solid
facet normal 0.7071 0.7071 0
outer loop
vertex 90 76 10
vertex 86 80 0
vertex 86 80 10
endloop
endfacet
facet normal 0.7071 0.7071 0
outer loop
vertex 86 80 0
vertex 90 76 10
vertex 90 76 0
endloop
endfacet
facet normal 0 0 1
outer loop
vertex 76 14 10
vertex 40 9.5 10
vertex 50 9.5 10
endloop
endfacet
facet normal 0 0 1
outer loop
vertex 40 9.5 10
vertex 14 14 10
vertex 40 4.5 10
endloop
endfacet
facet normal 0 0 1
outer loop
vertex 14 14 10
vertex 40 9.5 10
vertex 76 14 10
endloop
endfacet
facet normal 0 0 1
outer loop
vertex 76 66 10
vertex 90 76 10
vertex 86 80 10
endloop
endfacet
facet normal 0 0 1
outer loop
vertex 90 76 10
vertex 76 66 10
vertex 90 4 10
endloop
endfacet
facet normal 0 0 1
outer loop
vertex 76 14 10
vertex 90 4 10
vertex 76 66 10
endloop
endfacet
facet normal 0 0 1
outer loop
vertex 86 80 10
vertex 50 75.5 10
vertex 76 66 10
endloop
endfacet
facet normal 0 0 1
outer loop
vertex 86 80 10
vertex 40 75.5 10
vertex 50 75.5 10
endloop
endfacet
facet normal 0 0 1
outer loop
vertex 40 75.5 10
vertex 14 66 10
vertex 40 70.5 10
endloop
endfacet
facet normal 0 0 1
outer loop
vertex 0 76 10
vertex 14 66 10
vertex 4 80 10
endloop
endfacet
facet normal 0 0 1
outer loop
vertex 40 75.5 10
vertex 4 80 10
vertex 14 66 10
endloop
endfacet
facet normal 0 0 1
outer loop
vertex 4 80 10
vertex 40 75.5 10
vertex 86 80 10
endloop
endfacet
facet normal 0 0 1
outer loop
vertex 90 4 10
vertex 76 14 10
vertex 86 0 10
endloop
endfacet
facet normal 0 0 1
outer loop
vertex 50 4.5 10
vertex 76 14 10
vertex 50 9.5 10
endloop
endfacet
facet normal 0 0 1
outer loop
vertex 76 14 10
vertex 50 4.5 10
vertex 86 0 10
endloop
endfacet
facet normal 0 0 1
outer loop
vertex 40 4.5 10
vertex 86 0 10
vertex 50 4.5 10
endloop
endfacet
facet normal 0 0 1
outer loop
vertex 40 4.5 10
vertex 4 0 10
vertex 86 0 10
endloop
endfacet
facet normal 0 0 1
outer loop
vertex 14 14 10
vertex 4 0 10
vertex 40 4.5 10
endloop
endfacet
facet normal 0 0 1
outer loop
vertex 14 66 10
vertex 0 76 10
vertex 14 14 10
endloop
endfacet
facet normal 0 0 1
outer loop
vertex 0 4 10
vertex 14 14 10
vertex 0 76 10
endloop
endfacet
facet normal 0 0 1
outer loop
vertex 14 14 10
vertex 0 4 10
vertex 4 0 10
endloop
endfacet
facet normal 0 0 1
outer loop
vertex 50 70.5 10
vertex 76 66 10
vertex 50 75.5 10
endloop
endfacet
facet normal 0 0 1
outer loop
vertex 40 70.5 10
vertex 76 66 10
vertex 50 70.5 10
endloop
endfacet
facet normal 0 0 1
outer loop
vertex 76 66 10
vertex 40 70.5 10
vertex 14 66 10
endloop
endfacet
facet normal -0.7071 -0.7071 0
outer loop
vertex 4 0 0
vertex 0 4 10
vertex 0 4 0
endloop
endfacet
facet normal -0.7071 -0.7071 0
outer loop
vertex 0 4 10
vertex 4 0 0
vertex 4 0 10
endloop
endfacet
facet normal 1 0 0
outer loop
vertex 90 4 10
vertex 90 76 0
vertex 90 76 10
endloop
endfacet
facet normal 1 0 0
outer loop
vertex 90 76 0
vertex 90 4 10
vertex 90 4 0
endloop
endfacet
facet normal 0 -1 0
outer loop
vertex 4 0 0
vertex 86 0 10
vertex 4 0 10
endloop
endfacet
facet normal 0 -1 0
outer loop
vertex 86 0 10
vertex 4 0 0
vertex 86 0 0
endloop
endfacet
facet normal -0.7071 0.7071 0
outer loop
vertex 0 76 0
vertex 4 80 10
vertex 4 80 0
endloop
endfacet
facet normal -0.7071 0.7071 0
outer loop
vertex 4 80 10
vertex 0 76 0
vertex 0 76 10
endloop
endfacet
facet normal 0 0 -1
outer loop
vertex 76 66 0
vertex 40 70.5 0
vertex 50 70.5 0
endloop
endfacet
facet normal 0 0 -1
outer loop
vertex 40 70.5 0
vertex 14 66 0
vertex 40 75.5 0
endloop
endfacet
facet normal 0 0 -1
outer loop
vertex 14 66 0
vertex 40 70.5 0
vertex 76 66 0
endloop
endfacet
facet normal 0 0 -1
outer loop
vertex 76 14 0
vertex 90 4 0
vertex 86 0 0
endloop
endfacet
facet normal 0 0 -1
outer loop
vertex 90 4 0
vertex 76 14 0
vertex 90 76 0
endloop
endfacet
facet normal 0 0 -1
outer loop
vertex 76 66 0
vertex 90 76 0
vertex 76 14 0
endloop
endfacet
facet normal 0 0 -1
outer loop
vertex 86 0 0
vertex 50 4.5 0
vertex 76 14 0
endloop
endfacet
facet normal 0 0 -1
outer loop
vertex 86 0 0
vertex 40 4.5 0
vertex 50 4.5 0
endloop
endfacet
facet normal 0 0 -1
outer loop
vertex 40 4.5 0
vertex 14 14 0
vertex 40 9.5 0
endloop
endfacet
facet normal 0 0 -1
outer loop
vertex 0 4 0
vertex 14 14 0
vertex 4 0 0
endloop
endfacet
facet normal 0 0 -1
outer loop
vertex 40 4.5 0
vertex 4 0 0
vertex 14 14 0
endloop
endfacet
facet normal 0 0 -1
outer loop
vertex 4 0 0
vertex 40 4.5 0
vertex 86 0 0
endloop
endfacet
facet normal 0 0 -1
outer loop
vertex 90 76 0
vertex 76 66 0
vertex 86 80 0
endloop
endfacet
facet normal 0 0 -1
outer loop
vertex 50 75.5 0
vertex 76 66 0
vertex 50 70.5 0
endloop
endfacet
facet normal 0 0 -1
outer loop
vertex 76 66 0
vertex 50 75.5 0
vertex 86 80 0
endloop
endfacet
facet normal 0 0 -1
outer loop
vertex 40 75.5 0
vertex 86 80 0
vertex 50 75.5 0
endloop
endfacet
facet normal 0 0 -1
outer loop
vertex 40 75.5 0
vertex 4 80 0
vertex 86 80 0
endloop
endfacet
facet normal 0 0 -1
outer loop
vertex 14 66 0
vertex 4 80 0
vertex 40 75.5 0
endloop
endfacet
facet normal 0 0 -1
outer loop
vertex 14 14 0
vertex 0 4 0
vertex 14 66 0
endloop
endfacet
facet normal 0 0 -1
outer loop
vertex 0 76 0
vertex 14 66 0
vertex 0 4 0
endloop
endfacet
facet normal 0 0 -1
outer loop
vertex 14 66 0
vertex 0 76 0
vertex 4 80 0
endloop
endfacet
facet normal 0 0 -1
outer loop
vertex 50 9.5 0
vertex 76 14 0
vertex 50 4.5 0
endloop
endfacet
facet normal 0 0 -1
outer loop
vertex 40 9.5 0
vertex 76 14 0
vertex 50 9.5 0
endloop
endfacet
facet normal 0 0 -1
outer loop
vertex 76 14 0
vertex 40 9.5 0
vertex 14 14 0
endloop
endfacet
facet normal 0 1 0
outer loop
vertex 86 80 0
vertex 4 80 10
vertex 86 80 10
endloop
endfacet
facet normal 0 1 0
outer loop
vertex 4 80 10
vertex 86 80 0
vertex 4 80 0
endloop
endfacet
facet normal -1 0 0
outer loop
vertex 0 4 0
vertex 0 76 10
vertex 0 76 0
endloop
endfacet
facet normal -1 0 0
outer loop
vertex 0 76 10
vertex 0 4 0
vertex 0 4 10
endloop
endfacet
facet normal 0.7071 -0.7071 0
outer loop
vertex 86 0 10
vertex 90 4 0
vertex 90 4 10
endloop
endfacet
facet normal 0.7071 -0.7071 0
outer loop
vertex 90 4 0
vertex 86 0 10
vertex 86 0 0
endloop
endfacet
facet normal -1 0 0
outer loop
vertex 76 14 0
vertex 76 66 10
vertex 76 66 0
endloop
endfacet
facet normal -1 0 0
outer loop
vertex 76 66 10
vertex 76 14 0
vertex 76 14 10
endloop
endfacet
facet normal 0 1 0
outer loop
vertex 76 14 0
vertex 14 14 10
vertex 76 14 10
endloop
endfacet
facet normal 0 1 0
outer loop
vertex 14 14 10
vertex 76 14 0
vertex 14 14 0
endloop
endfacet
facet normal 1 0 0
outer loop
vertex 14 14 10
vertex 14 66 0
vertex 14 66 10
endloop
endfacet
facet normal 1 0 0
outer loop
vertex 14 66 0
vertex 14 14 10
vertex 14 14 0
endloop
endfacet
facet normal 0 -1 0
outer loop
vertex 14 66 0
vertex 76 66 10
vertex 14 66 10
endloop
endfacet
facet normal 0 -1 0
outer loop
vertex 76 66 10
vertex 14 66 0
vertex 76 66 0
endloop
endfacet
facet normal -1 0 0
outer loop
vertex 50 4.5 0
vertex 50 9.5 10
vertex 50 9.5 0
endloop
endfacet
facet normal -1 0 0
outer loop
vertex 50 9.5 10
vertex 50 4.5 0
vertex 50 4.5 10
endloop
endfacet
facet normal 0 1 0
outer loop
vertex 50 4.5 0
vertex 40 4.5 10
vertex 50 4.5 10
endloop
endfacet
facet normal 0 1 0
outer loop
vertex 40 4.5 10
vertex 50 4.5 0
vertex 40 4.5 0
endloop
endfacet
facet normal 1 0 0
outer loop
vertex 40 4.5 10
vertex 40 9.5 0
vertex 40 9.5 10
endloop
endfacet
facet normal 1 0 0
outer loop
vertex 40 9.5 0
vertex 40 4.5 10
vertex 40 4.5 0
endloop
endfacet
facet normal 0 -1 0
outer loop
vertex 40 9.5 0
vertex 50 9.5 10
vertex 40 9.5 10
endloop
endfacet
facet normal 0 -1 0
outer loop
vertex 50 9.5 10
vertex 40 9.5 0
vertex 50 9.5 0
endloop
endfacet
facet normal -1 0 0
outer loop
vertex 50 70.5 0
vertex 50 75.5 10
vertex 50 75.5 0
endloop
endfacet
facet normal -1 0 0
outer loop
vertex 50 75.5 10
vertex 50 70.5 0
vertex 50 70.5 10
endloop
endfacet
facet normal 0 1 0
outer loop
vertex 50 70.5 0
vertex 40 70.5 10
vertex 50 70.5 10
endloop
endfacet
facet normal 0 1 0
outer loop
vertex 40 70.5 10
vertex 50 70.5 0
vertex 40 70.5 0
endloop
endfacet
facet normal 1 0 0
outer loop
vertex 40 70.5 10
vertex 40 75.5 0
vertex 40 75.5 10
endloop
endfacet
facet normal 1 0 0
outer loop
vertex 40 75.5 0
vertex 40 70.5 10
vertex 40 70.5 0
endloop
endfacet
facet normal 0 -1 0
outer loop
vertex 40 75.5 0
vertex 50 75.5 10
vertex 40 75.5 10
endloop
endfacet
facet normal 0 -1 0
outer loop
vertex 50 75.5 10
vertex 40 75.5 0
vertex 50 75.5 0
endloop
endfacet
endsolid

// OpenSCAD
$fn = 32;

// ----------------------------------------------------------------------
// Frame plate: 90 x 80 frame, 14 mm rails
// ----------------------------------------------------------------------

// --- parameters (mm) ---
plate_l = 90;             // plate length, X
plate_w = 80;             // plate width, Y
plate_t = 10;             // plate thickness, Z (extrusion height)
corner_c = 4;             // corner chamfer
frame_bar = 14;           // frame rail width
slot_l = 10;              // adjustment slot length
slot_w = 5;               // adjustment slot width
fit_tol = 0.02;           // declared fit tolerance (prompt contract)
free_tol = 0.2;           // declared free tolerance (prompt contract)

win_l = plate_l - 2 * frame_bar;  // window length
win_w = plate_w - 2 * frame_bar;  // window width

profile = [[4, 0], [86, 0], [90, 4], [90, 76], [86, 80], [4, 80], [0, 76], [0, 4]];  // primary outline, 8 points, counter clockwise
void_1 = [[14, 14], [76, 14], [76, 66], [14, 66]];  // the window, 4 points
void_2 = [[40, 4.5], [50, 4.5], [50, 9.5], [40, 9.5]];  // adjustment slot, 4 points
void_3 = [[40, 70.5], [50, 70.5], [50, 75.5], [40, 75.5]];  // adjustment slot, 4 points

// --- the one profile operation ---
difference() {
  linear_extrude(height = plate_t) polygon(points = profile);
  translate([0, 0, -1])
    linear_extrude(height = plate_t + 2) polygon(points = void_1);
  translate([0, 0, -1])
    linear_extrude(height = plate_t + 2) polygon(points = void_2);
  translate([0, 0, -1])
    linear_extrude(height = plate_t + 2) polygon(points = void_3);
}
